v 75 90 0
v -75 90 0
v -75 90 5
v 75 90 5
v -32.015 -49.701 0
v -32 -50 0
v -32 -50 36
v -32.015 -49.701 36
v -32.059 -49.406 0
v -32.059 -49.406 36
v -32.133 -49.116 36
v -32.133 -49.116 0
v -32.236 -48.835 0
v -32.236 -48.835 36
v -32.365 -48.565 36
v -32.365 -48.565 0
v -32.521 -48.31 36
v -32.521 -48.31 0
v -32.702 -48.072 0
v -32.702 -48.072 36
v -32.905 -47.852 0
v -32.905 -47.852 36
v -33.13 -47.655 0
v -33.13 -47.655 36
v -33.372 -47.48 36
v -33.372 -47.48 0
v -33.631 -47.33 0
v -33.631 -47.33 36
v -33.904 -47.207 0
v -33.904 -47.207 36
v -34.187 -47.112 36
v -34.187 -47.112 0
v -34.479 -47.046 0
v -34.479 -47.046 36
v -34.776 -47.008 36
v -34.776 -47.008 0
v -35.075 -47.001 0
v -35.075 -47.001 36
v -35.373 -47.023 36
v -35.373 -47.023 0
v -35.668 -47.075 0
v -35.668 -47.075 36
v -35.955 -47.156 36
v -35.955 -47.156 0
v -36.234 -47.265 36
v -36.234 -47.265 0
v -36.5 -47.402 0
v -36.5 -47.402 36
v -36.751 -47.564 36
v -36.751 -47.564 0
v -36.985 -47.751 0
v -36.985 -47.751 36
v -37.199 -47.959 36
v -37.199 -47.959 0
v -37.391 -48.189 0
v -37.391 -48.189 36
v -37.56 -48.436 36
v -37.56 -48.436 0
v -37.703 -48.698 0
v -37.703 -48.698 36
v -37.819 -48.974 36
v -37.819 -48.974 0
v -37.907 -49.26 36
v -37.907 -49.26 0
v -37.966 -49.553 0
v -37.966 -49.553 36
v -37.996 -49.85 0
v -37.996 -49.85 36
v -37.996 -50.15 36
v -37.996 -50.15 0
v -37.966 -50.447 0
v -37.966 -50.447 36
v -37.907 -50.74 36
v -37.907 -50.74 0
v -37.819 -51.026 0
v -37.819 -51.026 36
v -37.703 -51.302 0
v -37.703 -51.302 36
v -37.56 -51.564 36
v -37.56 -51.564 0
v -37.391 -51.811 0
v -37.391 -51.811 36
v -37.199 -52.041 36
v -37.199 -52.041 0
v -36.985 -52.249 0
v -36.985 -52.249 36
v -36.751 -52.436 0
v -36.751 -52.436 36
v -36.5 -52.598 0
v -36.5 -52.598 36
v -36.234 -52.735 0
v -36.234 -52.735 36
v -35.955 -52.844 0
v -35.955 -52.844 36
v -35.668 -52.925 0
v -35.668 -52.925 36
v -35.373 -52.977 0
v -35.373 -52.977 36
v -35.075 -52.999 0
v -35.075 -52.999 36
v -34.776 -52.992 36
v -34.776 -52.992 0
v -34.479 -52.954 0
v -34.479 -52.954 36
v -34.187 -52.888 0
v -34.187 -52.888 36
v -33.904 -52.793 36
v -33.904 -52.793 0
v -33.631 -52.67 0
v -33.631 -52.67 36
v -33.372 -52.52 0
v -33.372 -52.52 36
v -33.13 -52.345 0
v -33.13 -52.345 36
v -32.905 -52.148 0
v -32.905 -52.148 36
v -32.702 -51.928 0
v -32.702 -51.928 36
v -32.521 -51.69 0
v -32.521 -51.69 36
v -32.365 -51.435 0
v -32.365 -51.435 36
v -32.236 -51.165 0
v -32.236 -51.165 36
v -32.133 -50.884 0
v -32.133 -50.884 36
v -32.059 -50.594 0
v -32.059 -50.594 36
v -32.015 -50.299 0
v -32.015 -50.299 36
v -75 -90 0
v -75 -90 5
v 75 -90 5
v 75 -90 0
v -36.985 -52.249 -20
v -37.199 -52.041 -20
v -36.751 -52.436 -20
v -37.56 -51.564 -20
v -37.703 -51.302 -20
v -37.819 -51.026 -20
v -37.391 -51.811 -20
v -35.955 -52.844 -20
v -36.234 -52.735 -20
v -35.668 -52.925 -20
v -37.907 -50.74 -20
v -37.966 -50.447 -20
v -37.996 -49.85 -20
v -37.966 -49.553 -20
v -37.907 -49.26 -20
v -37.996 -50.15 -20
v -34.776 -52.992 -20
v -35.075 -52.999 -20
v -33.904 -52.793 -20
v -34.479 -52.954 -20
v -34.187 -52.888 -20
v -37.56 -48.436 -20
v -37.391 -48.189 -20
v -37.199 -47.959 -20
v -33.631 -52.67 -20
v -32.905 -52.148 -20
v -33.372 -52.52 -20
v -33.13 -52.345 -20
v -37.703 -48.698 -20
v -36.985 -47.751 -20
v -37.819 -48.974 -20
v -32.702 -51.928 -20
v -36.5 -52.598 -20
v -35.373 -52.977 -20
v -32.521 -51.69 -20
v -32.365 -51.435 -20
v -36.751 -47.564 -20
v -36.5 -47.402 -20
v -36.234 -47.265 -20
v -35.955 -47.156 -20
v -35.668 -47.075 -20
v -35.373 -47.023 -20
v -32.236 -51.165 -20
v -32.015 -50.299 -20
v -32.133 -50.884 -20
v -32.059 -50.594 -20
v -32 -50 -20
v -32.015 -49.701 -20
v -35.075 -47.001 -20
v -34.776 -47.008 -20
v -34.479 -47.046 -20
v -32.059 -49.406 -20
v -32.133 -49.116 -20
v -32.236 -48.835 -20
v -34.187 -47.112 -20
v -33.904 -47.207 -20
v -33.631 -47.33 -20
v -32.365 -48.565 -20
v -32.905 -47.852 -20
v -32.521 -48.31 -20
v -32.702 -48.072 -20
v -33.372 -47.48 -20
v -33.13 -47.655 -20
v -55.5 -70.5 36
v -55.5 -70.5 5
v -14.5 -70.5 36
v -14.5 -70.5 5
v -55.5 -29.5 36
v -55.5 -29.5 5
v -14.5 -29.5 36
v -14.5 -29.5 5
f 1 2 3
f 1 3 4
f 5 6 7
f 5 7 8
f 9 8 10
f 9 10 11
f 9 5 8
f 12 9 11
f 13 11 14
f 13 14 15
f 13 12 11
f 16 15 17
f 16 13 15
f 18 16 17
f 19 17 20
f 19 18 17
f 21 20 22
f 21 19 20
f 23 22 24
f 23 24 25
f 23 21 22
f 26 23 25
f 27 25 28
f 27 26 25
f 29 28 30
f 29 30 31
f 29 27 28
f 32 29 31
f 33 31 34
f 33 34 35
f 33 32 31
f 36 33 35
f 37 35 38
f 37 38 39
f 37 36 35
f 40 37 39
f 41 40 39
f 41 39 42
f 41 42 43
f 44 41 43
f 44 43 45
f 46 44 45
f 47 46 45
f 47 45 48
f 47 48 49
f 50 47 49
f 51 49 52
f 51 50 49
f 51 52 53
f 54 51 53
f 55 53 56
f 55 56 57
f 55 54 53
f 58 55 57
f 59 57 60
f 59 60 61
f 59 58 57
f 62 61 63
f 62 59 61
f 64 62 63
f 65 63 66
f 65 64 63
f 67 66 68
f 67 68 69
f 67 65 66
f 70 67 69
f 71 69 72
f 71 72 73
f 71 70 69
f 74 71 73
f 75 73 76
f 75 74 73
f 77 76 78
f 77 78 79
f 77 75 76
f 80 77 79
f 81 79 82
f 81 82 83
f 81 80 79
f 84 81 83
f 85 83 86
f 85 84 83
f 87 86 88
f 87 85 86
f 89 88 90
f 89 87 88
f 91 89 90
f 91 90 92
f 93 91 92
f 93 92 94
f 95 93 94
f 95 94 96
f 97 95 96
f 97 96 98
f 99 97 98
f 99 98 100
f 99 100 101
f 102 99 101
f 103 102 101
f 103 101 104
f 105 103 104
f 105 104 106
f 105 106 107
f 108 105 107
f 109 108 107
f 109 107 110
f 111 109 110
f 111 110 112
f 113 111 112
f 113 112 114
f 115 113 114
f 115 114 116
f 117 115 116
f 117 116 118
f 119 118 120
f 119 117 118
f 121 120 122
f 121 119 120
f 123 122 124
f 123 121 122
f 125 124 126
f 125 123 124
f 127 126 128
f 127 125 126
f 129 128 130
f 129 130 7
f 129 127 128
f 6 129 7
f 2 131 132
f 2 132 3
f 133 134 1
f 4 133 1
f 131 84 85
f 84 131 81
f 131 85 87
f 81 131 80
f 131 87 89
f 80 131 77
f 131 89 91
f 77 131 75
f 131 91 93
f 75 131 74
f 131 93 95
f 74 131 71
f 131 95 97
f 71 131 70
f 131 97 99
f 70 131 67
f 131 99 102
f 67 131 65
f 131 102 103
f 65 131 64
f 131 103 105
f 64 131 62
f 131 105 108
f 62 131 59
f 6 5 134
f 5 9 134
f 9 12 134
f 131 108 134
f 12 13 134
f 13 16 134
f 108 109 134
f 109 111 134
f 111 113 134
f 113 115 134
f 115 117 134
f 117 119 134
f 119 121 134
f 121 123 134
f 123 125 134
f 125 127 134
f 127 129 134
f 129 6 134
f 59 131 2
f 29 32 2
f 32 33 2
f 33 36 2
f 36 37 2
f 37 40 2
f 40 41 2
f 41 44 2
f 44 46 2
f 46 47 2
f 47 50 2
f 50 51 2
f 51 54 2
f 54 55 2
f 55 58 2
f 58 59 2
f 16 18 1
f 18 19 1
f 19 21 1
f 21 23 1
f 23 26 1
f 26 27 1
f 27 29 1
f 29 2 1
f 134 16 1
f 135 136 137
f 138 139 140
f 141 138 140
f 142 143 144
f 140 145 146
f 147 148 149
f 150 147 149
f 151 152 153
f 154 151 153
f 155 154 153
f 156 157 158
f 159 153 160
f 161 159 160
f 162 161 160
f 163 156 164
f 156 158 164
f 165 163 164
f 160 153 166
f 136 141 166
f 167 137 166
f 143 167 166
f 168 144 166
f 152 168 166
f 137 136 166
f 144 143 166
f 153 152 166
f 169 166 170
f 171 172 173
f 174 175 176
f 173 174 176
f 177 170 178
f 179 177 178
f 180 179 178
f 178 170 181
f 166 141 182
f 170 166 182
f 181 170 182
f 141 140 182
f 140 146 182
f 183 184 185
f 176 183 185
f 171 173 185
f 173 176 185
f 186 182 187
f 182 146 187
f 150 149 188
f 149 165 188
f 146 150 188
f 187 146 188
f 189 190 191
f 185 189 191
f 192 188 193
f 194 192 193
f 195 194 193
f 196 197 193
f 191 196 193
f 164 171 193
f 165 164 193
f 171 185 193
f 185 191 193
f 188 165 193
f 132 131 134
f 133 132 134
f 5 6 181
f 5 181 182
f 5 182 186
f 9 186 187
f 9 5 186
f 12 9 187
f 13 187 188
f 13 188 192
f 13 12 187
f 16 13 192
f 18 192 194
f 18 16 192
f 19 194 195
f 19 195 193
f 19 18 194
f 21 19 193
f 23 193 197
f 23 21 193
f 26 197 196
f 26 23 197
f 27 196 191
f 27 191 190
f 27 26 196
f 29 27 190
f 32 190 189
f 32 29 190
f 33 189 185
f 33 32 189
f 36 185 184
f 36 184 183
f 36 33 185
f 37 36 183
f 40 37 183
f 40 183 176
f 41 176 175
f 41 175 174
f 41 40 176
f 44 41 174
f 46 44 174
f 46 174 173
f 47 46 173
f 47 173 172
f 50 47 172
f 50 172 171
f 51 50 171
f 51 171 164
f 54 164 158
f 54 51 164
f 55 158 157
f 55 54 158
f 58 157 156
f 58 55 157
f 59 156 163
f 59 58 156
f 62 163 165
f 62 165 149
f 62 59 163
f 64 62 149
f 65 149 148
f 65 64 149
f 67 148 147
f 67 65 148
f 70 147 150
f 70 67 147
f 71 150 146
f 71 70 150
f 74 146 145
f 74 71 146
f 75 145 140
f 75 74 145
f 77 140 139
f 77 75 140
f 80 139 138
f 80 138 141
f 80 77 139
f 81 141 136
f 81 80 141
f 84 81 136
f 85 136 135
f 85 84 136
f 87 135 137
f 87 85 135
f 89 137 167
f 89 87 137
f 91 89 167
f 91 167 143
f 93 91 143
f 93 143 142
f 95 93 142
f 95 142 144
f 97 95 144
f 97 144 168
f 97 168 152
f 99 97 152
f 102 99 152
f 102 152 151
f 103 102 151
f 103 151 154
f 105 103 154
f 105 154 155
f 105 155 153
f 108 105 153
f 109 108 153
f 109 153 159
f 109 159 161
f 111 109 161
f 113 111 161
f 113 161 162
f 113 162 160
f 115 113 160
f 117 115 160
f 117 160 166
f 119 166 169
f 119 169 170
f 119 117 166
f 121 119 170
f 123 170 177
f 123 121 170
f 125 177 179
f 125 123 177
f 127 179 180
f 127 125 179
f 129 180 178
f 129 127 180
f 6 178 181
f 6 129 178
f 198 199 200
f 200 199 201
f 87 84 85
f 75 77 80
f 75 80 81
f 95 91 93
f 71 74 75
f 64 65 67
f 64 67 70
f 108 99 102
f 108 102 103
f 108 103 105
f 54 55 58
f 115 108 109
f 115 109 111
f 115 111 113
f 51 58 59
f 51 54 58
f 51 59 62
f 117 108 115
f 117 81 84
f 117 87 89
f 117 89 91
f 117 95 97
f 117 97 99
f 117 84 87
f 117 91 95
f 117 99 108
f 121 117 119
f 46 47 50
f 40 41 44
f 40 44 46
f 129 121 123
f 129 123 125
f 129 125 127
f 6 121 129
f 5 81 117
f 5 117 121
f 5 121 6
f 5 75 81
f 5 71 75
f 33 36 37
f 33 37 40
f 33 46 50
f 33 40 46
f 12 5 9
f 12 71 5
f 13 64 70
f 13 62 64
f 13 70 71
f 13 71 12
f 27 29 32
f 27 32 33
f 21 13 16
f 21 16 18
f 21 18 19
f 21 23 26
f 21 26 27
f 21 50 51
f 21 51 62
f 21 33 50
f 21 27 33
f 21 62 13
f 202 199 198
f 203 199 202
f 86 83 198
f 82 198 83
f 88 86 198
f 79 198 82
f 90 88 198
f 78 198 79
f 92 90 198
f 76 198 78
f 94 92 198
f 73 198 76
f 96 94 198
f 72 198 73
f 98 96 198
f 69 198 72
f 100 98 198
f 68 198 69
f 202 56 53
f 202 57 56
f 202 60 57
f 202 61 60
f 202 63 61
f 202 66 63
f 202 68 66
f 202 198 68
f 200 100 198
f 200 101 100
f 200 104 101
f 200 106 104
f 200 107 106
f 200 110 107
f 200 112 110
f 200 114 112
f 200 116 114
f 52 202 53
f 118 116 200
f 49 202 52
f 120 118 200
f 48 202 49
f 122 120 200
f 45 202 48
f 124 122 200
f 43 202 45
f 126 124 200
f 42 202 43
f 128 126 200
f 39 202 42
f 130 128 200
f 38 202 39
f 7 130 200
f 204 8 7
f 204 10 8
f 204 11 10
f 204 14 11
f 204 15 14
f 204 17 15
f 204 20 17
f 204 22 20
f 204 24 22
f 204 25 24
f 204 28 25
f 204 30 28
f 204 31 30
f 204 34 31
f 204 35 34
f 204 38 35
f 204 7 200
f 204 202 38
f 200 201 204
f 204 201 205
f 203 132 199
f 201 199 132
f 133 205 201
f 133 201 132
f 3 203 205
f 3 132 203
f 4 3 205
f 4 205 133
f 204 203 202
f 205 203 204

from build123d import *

# Parameters (mm, degrees)
SKETCH1_W           = 150
SKETCH1_H           = 180
SKETCH1_W_2         = 41
SKETCH1_H_2         = 41
BOSS_EXTRUDE1_DEPTH = 5
SKETCH1_3_W         = 41
SKETCH1_3_H         = 41
SKETCH1_3_R         = 3
BOSS_EXTRUDE2_DEPTH = 36
SKETCH1_4_R         = 3
BOSS_EXTRUDE3_DEPTH = 20


with BuildPart() as part:
    # Sketch1 → Boss-Extrude1 (new body)
    with BuildSketch(Plane.XY):
        Rectangle(SKETCH1_W, SKETCH1_H)
        with Locations((-35, -50)):
            Rectangle(SKETCH1_W_2, SKETCH1_H_2, mode=Mode.SUBTRACT)
    extrude(amount=BOSS_EXTRUDE1_DEPTH)

    # Sketch1<3> → Boss-Extrude2 (add)
    with BuildSketch(Plane.XY):
        with Locations((-35, -50)):
            Rectangle(SKETCH1_3_W, SKETCH1_3_H)
        with Locations((-35, -50)):
            Circle(SKETCH1_3_R, mode=Mode.SUBTRACT)
    extrude(amount=BOSS_EXTRUDE2_DEPTH)


with BuildPart() as body_2:
    # Sketch1<4> → Boss-Extrude3 (new body)
    with BuildSketch(Plane.XY):
        with Locations((-35, -50)):
            Circle(SKETCH1_4_R)
    extrude(amount=-BOSS_EXTRUDE3_DEPTH)


solid = Compound([part.part, body_2.part])
